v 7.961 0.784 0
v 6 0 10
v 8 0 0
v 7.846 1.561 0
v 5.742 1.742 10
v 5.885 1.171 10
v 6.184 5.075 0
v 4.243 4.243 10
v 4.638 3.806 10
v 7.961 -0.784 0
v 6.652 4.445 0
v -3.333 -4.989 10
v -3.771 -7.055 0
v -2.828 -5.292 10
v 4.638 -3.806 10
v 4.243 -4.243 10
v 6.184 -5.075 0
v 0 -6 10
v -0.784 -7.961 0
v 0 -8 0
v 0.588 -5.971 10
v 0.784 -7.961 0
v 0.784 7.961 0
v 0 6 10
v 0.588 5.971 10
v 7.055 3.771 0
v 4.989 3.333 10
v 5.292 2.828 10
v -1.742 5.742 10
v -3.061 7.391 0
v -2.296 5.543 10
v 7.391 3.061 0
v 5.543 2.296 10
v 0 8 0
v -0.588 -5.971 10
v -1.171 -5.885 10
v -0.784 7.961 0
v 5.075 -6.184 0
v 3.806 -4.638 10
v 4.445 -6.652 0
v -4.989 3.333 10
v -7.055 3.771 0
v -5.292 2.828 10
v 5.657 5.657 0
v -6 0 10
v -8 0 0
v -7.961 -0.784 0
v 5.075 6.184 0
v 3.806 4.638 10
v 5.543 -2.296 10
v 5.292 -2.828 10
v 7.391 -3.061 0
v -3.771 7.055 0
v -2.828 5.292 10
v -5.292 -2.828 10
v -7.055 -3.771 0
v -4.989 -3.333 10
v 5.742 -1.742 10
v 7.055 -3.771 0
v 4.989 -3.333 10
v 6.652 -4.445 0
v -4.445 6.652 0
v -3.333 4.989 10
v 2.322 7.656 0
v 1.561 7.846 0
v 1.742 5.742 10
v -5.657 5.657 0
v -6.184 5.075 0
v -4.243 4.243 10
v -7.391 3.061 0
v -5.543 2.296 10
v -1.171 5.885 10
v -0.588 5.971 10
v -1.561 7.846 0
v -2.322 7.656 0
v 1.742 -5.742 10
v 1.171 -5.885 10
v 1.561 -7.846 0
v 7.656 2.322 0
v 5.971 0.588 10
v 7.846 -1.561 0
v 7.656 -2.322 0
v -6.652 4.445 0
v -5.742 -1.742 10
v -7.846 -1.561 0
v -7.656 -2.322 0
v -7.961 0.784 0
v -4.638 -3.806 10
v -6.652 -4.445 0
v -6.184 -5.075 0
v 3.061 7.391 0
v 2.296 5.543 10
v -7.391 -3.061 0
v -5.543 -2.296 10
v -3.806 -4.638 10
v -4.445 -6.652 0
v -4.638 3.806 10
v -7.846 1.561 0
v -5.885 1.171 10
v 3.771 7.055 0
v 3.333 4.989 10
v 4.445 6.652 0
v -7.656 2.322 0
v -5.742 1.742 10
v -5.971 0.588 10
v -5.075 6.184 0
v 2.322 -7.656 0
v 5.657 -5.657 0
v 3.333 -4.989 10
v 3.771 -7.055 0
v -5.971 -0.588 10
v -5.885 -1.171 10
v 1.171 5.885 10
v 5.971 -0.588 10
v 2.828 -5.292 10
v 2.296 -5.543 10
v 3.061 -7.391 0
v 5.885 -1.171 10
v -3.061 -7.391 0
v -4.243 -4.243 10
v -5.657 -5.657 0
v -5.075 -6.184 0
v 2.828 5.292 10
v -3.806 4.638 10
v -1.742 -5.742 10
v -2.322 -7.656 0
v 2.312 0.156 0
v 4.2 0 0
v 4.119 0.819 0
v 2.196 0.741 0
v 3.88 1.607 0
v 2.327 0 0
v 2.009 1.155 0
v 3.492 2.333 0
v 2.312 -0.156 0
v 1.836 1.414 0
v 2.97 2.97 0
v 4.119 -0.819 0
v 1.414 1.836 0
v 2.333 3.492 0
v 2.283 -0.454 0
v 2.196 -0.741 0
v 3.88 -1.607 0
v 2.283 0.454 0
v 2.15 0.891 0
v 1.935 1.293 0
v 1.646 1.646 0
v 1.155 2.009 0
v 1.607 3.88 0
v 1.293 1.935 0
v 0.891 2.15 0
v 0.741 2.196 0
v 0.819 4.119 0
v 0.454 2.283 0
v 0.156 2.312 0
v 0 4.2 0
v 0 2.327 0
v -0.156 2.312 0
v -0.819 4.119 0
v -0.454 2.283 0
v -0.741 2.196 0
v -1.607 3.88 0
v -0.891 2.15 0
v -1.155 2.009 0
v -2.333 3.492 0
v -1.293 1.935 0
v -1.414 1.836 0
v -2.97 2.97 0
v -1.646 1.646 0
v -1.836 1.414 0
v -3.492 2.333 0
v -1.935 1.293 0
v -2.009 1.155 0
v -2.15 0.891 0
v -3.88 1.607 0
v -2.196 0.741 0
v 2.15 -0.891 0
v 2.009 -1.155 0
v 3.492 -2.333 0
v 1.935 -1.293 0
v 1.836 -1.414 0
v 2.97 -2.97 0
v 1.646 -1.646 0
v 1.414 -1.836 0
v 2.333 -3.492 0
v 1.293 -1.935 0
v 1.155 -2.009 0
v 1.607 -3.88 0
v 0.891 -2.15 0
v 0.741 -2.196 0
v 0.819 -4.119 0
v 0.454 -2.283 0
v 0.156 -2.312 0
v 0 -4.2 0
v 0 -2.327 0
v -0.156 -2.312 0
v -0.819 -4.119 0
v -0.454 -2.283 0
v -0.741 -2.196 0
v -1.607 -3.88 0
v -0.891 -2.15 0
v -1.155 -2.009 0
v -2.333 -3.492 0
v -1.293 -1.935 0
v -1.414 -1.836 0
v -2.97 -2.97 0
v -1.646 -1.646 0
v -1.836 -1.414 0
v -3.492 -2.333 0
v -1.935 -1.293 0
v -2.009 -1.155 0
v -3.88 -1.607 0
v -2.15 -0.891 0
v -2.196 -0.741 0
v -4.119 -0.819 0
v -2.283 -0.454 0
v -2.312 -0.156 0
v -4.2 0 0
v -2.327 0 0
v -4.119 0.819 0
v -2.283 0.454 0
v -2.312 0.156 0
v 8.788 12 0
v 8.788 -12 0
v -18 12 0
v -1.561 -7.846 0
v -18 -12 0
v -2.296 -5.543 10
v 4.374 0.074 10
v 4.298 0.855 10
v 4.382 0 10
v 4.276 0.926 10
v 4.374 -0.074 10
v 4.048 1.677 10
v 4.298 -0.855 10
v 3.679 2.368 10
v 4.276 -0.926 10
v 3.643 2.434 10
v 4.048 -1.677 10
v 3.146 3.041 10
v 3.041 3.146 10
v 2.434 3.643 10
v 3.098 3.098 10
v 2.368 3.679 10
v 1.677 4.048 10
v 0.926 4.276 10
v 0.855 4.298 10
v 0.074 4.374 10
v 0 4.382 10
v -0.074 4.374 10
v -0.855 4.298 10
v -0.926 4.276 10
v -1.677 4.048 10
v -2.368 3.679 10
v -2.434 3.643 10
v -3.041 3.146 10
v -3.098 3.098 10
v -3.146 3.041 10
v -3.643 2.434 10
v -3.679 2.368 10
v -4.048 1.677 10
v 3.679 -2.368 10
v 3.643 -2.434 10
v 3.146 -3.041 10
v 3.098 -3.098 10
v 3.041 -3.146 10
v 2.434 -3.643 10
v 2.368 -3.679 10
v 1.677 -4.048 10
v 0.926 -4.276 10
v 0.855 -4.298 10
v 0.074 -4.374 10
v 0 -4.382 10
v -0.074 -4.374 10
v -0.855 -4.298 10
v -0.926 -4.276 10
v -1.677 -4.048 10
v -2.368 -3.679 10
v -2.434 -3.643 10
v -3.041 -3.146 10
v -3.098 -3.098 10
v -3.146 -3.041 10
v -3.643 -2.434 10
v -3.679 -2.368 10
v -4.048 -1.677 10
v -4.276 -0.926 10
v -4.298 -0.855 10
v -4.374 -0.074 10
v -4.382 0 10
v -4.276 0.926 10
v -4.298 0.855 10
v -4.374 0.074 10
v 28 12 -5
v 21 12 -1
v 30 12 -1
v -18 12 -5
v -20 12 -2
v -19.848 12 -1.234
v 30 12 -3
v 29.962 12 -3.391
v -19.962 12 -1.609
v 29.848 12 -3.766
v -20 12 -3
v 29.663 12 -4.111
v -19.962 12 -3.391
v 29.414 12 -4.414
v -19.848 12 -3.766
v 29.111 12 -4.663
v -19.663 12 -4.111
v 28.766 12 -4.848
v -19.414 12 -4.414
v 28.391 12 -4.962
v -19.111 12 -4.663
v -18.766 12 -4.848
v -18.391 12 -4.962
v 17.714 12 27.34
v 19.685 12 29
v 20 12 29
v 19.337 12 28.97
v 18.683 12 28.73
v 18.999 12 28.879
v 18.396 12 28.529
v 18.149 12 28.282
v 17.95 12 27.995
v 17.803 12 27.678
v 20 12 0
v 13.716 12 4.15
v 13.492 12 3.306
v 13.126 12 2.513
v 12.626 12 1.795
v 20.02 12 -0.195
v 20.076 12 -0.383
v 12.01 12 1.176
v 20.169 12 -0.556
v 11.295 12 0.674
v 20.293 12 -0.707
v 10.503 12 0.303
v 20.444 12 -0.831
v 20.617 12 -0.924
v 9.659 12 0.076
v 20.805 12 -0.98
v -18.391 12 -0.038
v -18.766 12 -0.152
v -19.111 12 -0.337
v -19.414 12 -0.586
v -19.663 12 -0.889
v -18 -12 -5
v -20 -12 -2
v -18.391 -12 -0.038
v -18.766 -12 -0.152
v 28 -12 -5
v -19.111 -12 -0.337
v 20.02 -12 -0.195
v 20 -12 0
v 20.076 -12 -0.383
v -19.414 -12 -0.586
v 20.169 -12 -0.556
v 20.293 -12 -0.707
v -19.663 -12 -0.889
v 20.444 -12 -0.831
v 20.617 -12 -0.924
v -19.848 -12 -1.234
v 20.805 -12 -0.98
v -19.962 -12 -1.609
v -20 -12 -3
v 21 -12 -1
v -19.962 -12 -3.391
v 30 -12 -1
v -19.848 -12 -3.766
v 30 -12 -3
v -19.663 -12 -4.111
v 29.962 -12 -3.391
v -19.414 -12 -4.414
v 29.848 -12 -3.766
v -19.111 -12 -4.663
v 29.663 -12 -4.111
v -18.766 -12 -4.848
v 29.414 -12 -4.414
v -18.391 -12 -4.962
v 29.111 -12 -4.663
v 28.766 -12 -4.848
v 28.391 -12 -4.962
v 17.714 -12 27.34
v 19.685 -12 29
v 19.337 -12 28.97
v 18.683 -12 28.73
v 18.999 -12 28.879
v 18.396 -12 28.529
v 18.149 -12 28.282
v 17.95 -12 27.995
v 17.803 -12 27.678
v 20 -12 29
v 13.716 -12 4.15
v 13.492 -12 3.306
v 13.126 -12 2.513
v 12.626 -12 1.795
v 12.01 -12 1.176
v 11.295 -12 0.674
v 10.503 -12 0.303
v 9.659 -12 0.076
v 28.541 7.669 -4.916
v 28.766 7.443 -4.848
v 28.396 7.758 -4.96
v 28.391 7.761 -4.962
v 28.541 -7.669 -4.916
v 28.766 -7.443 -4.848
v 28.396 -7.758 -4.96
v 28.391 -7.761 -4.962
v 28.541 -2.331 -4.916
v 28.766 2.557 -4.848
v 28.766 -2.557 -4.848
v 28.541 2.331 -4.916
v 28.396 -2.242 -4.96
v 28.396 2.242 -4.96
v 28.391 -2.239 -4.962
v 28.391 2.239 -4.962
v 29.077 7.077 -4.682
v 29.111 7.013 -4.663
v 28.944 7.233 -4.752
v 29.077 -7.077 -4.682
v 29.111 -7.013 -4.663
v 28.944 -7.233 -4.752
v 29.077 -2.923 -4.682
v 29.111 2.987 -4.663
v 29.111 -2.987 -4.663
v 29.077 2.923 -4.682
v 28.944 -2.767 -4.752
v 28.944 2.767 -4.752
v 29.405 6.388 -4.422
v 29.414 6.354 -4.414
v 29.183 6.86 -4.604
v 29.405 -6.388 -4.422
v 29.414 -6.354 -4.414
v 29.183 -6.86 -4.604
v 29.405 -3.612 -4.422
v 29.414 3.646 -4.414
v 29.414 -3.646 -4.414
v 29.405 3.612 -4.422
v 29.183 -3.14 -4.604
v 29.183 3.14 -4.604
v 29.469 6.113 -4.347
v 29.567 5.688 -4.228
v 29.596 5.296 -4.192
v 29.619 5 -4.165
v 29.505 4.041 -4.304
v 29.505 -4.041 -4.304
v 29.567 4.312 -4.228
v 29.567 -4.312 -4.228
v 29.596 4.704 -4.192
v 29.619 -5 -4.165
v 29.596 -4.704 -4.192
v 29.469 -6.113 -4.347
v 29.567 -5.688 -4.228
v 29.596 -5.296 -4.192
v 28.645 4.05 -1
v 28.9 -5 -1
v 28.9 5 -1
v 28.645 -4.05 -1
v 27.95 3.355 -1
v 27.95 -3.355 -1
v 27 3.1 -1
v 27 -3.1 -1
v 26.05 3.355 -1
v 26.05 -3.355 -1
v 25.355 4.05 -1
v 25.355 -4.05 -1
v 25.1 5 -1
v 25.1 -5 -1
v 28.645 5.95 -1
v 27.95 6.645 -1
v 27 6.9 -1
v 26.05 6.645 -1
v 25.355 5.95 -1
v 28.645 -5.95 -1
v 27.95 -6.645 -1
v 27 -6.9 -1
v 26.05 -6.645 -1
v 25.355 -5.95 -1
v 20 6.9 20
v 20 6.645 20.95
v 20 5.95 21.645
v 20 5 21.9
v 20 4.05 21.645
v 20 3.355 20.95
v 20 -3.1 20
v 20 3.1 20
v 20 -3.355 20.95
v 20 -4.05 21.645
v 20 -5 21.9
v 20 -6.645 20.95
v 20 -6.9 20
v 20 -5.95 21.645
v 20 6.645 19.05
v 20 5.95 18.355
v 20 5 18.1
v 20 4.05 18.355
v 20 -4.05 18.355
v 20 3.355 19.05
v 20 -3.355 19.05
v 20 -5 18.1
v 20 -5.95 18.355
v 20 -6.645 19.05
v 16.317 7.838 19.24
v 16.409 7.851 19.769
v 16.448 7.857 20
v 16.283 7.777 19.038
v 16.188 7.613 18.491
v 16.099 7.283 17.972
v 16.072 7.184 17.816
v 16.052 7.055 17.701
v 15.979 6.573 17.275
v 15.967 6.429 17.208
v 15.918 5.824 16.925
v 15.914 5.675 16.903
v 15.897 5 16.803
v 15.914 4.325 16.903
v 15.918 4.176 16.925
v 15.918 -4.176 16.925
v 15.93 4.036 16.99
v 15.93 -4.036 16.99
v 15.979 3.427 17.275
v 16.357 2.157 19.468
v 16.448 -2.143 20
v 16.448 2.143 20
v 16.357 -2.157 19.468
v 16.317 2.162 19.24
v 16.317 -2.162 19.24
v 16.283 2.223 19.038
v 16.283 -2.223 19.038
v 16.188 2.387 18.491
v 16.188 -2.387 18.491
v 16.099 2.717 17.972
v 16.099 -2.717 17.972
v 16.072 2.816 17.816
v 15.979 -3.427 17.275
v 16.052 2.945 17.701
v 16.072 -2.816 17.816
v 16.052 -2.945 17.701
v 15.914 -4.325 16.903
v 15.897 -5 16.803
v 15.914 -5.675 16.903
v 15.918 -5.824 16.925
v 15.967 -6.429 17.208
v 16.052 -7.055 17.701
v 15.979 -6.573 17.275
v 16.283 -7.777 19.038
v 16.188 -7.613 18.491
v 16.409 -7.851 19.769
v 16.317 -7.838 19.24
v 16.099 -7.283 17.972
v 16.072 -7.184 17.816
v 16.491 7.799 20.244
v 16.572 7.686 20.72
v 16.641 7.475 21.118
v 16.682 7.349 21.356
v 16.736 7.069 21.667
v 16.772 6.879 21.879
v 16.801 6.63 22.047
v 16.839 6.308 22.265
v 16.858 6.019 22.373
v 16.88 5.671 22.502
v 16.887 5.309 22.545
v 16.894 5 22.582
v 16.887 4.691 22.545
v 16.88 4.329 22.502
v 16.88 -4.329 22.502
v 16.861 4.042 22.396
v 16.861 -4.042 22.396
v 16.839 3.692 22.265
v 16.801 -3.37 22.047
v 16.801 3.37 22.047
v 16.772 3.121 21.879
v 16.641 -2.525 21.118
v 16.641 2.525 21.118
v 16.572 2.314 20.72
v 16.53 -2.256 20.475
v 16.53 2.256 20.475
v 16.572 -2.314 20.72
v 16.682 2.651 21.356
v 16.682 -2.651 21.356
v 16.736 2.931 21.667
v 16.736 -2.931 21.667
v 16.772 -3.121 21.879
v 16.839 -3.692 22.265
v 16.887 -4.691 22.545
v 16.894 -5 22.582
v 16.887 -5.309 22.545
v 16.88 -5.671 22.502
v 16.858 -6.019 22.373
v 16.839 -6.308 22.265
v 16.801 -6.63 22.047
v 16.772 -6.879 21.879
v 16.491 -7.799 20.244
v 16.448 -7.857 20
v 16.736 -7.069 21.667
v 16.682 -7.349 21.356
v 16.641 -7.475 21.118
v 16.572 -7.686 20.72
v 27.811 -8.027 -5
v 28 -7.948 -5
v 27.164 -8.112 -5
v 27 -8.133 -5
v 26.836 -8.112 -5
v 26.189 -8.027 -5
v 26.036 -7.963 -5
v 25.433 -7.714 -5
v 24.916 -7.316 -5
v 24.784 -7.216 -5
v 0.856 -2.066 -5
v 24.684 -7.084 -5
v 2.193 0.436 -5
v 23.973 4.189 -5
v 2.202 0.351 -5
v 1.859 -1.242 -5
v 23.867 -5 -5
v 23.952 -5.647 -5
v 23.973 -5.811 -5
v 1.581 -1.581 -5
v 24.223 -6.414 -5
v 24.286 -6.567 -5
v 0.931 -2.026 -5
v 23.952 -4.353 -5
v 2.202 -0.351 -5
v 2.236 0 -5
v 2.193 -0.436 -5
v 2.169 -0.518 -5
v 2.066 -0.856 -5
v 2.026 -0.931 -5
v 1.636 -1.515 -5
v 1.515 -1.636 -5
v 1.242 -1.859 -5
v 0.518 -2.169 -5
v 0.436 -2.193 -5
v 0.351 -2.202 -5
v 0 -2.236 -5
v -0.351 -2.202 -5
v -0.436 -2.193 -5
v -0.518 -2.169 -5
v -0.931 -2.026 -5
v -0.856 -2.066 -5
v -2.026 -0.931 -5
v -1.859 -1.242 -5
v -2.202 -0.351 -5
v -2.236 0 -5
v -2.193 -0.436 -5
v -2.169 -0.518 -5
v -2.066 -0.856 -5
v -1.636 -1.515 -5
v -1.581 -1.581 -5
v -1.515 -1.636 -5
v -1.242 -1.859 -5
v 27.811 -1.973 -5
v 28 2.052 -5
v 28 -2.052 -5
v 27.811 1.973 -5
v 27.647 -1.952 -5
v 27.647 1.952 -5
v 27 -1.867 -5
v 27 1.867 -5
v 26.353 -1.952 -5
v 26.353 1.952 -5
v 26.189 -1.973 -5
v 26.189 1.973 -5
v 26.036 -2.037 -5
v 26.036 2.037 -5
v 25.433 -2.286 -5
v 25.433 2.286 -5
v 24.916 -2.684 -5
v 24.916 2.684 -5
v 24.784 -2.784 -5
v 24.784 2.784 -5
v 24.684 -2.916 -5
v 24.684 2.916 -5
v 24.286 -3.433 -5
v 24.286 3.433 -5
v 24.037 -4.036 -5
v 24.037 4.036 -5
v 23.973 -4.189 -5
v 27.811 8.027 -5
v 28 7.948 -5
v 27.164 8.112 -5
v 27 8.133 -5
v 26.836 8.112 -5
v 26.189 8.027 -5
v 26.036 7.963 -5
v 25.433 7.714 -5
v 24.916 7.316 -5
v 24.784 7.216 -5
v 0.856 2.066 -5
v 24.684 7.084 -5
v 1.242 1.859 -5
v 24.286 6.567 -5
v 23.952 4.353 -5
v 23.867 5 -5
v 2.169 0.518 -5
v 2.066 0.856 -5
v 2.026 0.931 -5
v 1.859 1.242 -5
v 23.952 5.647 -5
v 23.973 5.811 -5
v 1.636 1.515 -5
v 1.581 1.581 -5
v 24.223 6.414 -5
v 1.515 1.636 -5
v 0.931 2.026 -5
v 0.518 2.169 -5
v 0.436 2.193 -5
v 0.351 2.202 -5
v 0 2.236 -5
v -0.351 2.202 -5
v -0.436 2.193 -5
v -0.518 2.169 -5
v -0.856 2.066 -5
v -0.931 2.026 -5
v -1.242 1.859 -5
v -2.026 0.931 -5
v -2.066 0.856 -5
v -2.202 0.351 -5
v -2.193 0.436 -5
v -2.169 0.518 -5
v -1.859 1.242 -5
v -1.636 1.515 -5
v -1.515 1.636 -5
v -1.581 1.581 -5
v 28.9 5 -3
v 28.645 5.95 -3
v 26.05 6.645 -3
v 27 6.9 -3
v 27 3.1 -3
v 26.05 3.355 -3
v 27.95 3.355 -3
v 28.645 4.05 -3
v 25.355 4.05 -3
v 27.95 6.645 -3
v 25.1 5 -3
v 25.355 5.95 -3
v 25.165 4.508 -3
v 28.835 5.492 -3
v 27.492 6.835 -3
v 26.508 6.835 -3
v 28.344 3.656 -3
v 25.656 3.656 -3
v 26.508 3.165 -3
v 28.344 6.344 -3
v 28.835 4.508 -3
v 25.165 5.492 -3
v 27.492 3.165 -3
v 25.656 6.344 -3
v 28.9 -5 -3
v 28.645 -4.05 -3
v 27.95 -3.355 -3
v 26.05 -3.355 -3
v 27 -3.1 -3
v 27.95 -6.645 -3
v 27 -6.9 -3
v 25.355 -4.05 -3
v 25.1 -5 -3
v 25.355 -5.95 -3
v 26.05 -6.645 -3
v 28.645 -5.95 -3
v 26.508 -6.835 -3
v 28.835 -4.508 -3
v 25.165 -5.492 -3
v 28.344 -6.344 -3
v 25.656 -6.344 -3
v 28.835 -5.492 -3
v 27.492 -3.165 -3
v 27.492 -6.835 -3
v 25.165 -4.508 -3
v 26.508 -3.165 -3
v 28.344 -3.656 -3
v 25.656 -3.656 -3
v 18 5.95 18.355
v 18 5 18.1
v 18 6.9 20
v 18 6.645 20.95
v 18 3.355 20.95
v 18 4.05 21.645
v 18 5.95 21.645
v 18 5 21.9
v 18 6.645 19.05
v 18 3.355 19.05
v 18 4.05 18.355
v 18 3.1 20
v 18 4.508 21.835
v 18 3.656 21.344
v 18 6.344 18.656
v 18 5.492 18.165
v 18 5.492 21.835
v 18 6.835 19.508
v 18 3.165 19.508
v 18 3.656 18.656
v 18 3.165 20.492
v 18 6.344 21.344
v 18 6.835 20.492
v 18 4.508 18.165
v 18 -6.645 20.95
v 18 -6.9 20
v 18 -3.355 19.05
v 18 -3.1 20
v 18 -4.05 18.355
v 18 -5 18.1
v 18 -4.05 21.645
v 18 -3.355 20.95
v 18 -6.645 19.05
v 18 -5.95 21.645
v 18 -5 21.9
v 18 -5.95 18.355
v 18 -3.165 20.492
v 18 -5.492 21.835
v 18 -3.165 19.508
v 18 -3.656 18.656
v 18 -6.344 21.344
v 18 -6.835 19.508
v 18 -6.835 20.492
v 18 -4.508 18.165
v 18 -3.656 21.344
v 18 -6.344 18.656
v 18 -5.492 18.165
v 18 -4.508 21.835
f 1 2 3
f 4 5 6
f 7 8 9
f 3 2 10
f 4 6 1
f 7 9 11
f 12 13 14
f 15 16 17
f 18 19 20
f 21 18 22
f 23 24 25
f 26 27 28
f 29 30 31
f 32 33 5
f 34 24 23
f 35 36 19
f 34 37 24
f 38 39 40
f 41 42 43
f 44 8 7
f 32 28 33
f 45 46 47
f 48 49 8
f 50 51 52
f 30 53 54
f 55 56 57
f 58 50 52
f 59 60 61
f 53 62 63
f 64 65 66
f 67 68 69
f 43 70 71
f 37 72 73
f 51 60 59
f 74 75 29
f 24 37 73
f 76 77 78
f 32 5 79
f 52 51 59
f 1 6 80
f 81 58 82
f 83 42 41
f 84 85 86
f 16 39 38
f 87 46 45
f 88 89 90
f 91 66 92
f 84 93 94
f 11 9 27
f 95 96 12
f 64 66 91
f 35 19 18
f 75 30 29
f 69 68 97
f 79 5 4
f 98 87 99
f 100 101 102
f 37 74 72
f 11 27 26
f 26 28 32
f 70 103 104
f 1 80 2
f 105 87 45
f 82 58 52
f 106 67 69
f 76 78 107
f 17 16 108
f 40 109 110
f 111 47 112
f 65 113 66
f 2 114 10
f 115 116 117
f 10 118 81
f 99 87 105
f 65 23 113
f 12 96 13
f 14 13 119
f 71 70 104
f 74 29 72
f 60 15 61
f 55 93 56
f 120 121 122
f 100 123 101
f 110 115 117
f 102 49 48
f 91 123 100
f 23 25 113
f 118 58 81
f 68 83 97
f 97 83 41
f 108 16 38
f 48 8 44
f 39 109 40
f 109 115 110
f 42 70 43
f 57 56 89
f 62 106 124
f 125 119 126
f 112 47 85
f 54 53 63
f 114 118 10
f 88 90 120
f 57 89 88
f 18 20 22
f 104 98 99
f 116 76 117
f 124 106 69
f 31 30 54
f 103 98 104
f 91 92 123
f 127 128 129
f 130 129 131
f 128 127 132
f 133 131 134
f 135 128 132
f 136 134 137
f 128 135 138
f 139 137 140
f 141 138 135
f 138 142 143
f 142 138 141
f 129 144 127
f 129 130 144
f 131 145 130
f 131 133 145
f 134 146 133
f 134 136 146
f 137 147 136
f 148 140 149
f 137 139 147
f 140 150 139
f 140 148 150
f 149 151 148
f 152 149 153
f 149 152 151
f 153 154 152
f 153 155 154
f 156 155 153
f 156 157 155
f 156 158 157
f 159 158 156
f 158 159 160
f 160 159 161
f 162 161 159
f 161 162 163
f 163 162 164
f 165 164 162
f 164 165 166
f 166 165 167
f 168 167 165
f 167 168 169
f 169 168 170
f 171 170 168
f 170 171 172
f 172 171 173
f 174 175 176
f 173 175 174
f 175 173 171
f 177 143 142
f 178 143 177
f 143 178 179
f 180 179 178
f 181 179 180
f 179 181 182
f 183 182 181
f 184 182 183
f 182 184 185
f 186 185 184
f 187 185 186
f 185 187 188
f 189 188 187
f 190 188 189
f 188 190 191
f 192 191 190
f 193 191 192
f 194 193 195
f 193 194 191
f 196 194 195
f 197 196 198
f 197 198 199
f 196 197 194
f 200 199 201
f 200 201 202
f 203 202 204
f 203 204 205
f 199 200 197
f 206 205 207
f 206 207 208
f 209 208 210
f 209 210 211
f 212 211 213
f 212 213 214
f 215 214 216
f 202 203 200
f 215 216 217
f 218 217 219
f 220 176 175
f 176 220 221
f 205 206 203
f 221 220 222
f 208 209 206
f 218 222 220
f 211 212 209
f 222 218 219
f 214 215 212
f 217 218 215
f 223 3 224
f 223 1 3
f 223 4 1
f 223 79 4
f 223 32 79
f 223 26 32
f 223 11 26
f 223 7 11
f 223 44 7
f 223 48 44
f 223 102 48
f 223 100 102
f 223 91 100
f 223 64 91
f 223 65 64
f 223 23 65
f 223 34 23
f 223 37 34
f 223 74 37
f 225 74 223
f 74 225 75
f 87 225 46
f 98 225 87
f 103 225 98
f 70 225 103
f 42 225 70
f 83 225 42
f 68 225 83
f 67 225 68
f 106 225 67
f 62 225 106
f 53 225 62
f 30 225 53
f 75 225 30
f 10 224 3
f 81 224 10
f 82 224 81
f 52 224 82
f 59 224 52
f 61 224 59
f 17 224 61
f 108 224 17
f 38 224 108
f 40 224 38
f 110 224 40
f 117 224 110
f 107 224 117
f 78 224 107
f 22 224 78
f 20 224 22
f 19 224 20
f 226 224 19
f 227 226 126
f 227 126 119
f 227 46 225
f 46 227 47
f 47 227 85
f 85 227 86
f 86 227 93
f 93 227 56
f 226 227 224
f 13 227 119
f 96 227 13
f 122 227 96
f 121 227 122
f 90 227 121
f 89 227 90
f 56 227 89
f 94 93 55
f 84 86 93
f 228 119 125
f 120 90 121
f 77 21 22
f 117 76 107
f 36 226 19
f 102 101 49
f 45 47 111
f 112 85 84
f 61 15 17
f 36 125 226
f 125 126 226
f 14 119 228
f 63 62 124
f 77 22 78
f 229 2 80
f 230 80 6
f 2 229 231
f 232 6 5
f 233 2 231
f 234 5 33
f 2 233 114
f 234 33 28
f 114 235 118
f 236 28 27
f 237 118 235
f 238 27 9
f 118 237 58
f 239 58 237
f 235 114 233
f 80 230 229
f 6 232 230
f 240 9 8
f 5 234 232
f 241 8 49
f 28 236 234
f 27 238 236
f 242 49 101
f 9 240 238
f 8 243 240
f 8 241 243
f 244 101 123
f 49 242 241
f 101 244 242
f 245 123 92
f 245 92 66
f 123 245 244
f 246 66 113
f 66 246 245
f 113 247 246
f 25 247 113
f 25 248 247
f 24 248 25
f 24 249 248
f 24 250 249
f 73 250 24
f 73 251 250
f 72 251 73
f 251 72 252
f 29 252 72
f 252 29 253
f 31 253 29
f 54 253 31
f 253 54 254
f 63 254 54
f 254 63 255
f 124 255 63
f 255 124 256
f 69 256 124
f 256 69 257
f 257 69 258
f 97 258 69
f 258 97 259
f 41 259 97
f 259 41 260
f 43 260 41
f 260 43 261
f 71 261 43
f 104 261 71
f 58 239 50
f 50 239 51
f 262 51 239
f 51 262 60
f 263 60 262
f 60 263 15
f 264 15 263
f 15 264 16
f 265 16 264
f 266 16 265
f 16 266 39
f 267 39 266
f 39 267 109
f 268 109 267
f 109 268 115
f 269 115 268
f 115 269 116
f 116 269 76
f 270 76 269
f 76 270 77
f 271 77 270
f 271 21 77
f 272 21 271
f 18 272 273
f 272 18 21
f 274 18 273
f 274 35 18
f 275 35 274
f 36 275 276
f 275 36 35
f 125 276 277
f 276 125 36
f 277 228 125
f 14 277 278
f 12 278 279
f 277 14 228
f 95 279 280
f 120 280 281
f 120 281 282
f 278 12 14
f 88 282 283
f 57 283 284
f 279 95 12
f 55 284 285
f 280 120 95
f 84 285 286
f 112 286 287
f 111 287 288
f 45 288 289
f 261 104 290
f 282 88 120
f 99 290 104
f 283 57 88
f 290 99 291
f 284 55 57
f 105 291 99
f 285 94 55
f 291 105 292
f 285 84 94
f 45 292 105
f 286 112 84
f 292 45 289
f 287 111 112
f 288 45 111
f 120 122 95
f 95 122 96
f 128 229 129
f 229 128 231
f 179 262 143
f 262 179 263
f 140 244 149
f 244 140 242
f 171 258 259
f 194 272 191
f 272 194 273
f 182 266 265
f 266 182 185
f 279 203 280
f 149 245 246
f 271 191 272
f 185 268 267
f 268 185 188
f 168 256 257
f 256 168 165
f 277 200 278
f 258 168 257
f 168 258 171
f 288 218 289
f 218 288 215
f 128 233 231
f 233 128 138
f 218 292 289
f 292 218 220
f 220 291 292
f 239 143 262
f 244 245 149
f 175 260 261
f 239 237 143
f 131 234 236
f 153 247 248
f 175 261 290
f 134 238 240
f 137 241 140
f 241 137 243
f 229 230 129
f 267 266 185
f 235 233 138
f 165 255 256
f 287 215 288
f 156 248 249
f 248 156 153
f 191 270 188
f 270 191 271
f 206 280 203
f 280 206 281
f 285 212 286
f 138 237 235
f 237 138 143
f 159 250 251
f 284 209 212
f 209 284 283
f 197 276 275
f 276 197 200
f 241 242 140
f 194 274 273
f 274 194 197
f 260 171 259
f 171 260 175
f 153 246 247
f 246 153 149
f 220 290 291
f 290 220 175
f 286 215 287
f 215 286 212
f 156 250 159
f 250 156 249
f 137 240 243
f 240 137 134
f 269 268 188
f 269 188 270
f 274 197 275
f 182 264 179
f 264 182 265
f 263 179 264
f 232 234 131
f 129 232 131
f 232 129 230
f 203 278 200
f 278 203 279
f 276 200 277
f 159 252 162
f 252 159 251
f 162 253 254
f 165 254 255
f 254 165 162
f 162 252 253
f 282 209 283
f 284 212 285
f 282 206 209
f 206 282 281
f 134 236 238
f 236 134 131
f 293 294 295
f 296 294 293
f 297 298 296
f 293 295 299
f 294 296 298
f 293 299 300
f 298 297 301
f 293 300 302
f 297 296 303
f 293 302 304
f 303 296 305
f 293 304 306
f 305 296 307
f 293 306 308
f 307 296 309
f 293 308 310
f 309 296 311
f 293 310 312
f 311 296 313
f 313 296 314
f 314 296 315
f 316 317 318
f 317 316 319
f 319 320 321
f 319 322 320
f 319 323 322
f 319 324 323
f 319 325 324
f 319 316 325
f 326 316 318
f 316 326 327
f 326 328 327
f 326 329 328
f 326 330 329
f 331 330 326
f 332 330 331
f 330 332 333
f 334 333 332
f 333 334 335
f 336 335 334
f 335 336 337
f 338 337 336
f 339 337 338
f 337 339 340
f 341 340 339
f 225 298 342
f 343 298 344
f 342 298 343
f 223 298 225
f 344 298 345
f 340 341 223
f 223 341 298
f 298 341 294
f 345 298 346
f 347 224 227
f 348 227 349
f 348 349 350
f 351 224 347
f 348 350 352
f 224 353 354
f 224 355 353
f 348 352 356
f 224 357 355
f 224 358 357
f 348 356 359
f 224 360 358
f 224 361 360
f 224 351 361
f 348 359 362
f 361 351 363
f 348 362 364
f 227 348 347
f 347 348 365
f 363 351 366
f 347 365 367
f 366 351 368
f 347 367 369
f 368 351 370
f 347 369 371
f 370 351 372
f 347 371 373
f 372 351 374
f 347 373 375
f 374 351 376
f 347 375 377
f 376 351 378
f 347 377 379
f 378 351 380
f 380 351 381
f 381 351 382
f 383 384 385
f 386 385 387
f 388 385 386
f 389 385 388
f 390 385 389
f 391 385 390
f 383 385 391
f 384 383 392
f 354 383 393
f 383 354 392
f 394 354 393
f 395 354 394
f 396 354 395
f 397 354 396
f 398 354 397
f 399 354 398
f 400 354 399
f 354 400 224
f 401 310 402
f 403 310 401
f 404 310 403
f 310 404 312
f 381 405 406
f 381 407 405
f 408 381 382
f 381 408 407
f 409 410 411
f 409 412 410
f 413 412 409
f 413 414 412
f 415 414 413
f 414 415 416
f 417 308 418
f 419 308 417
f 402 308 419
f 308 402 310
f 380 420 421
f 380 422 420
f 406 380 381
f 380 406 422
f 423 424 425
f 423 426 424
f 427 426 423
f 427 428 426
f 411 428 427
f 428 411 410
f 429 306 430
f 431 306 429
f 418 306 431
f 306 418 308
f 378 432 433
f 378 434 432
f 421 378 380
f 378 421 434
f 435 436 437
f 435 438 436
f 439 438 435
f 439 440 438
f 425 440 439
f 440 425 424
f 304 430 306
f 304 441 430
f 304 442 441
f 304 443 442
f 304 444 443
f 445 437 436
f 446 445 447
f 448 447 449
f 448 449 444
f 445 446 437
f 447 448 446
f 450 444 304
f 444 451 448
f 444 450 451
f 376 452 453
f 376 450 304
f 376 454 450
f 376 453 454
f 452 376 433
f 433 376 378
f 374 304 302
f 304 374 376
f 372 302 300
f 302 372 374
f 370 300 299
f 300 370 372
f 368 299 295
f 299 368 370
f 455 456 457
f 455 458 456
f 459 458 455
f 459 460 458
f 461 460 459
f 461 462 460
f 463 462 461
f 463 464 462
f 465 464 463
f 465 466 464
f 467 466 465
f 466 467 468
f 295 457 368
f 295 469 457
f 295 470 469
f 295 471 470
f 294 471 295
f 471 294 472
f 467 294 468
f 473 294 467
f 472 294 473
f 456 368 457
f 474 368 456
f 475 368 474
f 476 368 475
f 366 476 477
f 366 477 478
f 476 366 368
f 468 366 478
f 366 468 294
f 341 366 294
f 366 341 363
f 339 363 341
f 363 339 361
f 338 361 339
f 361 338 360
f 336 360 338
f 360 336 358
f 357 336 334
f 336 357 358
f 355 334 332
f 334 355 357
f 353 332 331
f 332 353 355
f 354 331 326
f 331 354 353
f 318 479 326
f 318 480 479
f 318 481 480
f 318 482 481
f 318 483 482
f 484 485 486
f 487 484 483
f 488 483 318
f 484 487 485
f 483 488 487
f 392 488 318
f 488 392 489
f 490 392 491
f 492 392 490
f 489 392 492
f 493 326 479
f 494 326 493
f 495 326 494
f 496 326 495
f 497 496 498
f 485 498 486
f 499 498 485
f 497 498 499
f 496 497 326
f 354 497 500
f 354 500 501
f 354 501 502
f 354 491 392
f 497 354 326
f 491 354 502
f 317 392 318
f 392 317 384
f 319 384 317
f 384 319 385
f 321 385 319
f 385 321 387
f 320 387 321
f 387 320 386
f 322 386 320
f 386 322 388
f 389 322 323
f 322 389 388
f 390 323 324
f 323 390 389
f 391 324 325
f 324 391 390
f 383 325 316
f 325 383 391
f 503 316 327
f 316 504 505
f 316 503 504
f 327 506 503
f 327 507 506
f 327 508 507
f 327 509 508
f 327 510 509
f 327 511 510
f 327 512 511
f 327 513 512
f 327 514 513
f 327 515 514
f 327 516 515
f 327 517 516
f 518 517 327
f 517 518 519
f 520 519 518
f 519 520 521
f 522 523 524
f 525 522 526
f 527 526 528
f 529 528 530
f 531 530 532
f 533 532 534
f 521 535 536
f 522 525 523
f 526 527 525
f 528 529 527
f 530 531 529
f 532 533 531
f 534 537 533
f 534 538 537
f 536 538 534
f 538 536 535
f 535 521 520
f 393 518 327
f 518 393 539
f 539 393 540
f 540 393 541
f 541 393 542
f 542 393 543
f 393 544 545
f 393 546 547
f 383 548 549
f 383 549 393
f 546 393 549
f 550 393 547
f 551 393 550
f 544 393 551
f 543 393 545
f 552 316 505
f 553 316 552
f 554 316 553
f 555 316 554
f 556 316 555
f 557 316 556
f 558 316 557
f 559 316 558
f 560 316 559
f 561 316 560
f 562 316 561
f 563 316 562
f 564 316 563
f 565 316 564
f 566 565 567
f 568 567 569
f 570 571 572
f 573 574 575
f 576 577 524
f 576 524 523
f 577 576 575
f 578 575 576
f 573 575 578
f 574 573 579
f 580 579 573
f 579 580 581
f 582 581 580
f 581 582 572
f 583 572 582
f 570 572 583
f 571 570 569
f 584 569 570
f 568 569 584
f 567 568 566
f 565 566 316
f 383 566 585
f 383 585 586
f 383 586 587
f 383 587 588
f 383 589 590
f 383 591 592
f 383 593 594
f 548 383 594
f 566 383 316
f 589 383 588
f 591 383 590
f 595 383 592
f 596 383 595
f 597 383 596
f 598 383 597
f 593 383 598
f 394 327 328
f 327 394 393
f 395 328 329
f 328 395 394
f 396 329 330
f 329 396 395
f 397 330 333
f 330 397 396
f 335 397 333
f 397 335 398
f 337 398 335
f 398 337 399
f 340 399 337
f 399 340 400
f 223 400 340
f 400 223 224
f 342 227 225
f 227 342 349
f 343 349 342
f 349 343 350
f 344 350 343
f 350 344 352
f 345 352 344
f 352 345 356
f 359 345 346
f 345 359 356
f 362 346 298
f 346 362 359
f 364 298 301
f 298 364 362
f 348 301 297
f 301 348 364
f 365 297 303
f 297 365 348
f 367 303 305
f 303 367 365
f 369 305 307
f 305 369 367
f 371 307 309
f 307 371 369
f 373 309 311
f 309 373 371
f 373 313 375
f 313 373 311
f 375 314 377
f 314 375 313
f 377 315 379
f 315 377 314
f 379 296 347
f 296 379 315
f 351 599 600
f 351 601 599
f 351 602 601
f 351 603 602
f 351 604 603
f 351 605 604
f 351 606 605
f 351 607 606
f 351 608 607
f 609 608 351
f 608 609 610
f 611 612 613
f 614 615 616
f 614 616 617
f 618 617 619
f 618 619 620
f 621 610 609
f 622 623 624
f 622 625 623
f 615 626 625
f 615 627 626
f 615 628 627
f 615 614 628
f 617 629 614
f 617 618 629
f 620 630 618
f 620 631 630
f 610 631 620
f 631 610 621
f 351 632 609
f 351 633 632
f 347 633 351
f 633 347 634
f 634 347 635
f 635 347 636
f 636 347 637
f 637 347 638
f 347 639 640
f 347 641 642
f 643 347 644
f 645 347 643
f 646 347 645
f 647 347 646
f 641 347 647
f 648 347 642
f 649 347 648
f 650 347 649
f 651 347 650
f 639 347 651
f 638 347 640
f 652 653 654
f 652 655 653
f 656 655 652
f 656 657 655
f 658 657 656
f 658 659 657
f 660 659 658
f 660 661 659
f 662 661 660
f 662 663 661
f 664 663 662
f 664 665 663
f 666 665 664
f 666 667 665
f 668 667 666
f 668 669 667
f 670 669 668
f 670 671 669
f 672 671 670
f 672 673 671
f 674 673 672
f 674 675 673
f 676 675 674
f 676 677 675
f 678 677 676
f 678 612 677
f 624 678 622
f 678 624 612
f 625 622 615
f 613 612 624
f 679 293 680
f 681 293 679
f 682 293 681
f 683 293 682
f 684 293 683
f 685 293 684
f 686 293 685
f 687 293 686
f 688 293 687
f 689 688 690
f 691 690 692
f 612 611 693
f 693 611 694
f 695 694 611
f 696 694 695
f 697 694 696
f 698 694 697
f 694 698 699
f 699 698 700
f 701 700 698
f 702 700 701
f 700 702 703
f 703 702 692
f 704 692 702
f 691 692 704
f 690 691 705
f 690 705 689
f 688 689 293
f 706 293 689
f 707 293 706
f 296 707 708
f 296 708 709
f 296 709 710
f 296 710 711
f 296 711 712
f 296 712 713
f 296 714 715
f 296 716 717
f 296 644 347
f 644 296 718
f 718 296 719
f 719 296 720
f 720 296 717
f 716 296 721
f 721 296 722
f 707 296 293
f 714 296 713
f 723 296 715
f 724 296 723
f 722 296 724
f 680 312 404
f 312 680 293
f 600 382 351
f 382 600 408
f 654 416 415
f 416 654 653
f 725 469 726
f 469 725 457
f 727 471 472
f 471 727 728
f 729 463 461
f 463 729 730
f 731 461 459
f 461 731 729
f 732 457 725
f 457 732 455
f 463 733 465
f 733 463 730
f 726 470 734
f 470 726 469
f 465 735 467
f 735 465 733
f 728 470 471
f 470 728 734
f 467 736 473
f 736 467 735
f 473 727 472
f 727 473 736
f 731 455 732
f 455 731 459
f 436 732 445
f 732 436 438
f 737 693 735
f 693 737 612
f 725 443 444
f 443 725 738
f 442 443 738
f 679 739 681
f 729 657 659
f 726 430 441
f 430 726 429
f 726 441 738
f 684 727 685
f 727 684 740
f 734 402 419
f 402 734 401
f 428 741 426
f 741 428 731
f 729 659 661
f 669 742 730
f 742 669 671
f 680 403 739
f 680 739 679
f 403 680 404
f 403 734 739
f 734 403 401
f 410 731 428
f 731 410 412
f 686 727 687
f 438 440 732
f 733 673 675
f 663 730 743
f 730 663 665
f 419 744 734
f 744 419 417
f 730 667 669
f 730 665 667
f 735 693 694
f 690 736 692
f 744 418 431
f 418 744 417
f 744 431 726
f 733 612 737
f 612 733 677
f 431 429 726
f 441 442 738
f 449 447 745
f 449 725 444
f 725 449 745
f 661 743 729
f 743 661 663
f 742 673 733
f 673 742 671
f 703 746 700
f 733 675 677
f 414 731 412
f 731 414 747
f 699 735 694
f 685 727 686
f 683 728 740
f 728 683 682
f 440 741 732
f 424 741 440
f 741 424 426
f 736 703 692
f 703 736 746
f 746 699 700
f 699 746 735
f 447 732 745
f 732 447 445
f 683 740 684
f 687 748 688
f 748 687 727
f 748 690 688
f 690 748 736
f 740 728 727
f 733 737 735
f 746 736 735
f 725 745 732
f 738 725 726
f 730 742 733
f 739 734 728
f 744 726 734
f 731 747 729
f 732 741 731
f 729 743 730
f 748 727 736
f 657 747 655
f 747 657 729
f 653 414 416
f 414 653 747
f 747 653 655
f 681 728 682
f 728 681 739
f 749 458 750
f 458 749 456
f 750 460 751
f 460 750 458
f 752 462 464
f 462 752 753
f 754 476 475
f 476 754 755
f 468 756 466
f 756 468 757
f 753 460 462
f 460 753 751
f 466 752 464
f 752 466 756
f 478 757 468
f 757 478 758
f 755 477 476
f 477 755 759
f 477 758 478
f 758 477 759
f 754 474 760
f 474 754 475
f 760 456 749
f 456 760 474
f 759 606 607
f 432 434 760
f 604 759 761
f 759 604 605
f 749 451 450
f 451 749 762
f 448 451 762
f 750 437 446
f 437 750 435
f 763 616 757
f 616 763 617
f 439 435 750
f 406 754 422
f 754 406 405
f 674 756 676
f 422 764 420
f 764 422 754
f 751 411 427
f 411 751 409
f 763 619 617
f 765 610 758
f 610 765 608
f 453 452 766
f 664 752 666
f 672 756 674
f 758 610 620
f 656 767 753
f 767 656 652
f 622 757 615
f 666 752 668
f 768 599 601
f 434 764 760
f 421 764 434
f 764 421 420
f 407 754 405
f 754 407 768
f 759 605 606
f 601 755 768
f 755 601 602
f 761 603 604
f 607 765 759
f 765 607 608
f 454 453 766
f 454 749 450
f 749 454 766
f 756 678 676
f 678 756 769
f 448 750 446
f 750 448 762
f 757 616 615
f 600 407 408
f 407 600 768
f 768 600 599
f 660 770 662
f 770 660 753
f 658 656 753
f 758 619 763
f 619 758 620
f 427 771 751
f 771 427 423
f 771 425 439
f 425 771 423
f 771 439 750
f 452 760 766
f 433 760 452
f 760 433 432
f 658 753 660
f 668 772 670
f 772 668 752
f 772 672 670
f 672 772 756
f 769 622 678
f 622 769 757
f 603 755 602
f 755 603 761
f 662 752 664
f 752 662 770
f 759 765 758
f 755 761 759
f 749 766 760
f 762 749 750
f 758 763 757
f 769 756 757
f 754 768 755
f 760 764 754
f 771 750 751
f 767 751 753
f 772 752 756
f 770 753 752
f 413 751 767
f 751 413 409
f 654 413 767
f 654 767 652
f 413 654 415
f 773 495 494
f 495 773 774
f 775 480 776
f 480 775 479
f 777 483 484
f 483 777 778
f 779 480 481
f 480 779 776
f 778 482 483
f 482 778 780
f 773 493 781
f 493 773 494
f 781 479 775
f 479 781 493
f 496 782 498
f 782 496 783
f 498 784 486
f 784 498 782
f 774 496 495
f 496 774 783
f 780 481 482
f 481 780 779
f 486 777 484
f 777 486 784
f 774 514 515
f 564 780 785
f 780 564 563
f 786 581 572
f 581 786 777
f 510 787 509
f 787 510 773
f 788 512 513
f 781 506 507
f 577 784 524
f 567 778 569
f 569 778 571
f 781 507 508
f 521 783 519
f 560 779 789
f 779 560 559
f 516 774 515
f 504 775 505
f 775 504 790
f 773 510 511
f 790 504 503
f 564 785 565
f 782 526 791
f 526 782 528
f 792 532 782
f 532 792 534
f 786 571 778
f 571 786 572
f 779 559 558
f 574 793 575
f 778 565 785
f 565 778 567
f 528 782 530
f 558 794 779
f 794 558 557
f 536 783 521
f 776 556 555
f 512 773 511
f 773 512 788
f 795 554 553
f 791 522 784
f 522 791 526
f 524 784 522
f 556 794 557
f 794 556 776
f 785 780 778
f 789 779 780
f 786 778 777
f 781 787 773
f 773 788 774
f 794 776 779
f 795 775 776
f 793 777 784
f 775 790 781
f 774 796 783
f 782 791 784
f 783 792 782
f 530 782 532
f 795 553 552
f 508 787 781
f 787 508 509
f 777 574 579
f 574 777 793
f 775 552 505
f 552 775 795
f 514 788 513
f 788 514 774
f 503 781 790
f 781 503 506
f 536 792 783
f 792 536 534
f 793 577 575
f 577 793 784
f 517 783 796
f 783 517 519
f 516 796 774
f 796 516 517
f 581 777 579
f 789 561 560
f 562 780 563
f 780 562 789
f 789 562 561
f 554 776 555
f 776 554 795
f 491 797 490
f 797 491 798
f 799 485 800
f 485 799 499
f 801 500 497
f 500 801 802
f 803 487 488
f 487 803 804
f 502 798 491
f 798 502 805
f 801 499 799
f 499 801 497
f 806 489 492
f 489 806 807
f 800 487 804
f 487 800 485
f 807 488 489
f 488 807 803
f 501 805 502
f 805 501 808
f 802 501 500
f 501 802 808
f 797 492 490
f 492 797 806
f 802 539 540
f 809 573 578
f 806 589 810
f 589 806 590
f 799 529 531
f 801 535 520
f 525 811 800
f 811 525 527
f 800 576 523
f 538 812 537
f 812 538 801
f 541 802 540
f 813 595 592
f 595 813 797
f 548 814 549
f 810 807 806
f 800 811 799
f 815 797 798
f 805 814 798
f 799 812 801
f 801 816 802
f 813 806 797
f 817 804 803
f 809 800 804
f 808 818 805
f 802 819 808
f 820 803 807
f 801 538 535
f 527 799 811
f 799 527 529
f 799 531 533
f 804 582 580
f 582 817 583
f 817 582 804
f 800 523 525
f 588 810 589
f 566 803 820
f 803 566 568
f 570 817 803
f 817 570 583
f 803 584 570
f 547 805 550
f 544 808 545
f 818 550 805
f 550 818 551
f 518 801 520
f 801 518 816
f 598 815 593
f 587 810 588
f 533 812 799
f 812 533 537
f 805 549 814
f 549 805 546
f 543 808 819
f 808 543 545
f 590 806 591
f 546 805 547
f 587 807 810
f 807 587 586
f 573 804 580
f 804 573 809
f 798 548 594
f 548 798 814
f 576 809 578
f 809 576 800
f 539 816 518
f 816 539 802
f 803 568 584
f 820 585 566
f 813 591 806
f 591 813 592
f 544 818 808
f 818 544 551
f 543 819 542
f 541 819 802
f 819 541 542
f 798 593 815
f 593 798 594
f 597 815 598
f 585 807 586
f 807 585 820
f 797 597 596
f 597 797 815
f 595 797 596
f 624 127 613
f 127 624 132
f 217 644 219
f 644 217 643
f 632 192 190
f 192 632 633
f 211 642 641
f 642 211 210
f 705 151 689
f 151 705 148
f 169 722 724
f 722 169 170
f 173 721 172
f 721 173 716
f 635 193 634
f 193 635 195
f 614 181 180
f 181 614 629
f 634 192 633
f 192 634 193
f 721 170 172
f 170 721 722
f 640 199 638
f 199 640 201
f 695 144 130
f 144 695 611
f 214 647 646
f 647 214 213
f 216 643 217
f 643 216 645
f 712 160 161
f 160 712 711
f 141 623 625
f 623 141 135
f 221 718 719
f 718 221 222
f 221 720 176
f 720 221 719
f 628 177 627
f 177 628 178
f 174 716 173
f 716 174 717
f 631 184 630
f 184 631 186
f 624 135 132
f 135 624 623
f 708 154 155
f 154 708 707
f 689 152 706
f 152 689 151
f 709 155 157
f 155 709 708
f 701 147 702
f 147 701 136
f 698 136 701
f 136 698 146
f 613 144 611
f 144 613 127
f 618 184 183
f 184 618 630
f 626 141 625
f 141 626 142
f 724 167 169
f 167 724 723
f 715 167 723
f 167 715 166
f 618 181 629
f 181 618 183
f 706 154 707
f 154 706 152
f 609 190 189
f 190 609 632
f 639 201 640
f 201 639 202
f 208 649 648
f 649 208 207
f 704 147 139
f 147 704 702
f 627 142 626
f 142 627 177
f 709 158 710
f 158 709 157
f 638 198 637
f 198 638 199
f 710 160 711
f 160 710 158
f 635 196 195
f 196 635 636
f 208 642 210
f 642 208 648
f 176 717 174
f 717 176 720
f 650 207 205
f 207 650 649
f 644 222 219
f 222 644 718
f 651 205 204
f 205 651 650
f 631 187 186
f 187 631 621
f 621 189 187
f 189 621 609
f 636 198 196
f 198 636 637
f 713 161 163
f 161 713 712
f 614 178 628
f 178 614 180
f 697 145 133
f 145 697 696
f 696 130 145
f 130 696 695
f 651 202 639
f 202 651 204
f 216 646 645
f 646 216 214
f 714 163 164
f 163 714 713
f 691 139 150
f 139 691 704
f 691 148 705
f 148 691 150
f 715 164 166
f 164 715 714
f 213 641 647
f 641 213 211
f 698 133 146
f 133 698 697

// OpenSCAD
R = 4;
Fn = 4;
HR = 10;
M3_2 = 1.5;

bxW = 20;
bxH = 24;
bxD = 20;

difference(){
    cylinder(HR,2*R, 1.5*R, $fn=R*2*2*Fn);
    cylinder(HR+1,R+0.2, R+0.4, $fn=R*2*Fn);
}

difference(){
translate([0, bxH/2, -5])
    rotate([90,0,0])
    linear_extrude(bxH)
        import("../dxf/barHolderSidev2.dxf", $fn=Fn*8);
//holes at back
translate([27,5,-10])
    cylinder(10, M3_2+0.4, M3_2+0.4, $fn=M3_2*2*Fn);
translate([27,5,-6])
    cylinder(3, M3_2*2.5, M3_2+0.4, $fn=M3_2*2*2*Fn);
translate([27,-5,-10])
    cylinder(10, M3_2+0.4, M3_2+0.4, $fn=M3_2*2*Fn);
translate([27,-5,-6])
    cylinder(3, M3_2*2.5, M3_2+0.4, $fn=M3_2*2*2*Fn);

//holse at bottom
translate([15,5,20])
    rotate([0,90,0])
        cylinder(10, M3_2+0.4, M3_2+0.4, $fn=M3_2*2*Fn);
translate([15,5,20])
    rotate([0,90,0])
        cylinder(3, M3_2*2.5, M3_2+0.4, $fn=M3_2*2*2*Fn);
translate([15,-5,20])
    rotate([0,90,0])
        cylinder(10, M3_2+0.4, M3_2+0.4, $fn=M3_2*2*Fn);
translate([15,-5,20])
    rotate([0,90,0])
        cylinder(3, M3_2*2.5, M3_2+0.4, $fn=M3_2*2*2*Fn);        

//additional hole for better holder support
translate([0,0,-7])
    cylinder(HR+1,R/2+0.2, R/2+0.4, $fn=R*2*Fn);
}

//    rotate_extrude($Fn=Fn*10)
//        import("../dxf/barHolderD8.dxf", $Fn=Fn*4); 
